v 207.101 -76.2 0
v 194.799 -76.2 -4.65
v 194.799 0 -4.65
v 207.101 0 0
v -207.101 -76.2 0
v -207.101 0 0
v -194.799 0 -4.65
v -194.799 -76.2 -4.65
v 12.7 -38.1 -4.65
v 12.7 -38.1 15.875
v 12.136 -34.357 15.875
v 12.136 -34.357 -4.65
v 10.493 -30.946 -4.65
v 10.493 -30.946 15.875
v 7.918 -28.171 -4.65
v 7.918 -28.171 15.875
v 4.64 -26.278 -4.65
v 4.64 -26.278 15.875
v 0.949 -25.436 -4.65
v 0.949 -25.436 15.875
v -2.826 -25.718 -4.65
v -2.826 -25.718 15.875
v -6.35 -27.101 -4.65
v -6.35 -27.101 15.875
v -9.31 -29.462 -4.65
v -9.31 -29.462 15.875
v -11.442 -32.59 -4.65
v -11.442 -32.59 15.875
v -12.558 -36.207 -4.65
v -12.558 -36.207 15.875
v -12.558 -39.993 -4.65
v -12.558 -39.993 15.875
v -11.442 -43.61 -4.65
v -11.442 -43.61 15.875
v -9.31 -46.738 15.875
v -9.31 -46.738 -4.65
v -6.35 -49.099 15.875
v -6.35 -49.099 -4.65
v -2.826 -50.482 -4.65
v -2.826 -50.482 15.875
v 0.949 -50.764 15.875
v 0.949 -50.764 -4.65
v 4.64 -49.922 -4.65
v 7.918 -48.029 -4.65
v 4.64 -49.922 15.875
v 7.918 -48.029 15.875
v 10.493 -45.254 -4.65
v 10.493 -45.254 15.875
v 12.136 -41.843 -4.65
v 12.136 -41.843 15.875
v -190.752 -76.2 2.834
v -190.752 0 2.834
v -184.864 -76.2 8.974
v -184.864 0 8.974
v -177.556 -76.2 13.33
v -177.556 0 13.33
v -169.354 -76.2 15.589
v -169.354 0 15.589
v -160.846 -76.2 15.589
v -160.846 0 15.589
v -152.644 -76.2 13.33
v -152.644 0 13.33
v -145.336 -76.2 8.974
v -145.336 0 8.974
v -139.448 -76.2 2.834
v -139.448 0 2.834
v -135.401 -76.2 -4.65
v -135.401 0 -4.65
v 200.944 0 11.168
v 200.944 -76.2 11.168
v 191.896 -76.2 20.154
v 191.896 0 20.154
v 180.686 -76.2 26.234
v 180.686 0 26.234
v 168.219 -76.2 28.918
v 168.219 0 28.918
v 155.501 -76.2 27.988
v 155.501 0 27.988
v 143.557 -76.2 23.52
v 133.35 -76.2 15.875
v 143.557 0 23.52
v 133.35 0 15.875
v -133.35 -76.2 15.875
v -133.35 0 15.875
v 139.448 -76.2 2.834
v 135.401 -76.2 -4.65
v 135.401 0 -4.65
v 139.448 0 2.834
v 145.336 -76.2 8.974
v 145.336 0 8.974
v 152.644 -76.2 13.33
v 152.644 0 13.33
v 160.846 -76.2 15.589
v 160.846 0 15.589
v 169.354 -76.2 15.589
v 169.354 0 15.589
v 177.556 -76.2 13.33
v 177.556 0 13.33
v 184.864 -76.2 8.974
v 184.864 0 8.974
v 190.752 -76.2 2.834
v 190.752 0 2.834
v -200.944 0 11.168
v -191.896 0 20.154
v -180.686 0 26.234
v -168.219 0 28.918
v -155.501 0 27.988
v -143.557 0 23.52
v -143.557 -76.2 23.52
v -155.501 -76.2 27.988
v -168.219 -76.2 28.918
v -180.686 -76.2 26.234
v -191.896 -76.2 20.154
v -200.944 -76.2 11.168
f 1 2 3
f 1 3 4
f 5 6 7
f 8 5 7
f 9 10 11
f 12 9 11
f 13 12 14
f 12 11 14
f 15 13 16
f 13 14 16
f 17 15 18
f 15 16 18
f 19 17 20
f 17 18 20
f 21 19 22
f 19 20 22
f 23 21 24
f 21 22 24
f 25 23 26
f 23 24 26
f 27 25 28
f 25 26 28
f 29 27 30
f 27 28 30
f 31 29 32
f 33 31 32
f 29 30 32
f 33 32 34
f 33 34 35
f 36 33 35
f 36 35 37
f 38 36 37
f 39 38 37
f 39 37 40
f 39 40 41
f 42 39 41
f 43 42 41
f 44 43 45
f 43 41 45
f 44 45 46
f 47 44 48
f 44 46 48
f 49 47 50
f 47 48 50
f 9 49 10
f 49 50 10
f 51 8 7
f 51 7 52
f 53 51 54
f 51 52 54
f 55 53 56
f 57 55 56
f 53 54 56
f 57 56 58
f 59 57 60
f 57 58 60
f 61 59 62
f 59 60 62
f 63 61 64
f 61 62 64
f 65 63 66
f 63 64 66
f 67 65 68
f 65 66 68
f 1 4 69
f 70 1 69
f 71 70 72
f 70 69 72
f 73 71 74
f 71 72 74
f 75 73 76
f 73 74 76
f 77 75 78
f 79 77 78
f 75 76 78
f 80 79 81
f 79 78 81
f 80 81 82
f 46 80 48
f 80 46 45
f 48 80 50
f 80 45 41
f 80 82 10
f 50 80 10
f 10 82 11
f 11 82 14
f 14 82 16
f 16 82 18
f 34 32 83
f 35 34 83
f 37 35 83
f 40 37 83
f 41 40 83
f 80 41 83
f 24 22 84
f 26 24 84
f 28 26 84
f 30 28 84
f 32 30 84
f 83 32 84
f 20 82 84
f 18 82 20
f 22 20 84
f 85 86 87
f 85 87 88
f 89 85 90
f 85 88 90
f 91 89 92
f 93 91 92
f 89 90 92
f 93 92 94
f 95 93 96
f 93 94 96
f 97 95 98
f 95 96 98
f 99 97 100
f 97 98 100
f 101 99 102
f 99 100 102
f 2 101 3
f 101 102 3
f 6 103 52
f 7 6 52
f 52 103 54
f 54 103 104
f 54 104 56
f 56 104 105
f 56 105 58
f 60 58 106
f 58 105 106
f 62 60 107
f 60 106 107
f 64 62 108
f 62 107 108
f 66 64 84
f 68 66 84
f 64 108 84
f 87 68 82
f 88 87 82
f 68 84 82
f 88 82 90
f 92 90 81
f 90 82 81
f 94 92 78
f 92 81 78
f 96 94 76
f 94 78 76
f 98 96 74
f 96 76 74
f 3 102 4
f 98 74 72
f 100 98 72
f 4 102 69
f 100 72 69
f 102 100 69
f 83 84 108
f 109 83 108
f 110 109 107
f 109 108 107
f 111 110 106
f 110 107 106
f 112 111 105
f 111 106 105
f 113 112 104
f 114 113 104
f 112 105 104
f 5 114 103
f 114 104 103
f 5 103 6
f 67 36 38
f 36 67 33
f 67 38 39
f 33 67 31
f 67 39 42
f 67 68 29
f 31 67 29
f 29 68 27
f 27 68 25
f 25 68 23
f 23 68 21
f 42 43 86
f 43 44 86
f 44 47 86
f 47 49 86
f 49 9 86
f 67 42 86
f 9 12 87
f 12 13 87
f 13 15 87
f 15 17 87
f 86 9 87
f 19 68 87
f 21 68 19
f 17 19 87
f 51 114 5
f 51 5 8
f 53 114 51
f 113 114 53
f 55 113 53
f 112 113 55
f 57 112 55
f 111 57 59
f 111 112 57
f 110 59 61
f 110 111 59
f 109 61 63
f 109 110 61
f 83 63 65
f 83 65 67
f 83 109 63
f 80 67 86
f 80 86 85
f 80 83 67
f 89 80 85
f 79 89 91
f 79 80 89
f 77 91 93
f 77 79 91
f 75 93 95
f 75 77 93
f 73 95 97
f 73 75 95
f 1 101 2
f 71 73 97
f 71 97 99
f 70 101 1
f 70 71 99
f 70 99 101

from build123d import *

# Parameters (mm, degrees)
F1_DEPTH = 76.2
F2_R     = 12.7
F3_DEPTH = 20.52468


with BuildPart() as f1:
    # F0 (on Front) → F1 (new body)
    with BuildSketch(Plane.XZ):
        with BuildLine():
            ThreePointArc((207.101302, 0), (174.548609, 28.020886), (133.35, 15.875))
            Line((133.35, 15.875), (-133.35, 15.875))
            ThreePointArc((-133.35, 15.875), (-174.548609, 28.020886), (-207.101302, 0))
            Line((-207.101302, 0), (-194.799406, -4.64968))
            ThreePointArc((-194.799406, -4.64968), (-165.1, 15.875), (-135.400594, -4.64968))
            Line((-135.400594, -4.64968), (135.400594, -4.64968))
            ThreePointArc((135.400594, -4.64968), (165.1, 15.875), (194.799406, -4.64968))
            Line((194.799406, -4.64968), (207.101302, 0))
        make_face()
    extrude(amount=F1_DEPTH)

    # F2 (on face) → F3 (cut, through all)
    with BuildSketch(Plane.XY.offset(15.875)):
        with Locations((0, -38.1)):
            Circle(F2_R)
    extrude(amount=-F3_DEPTH, mode=Mode.SUBTRACT)


solid = f1.part
